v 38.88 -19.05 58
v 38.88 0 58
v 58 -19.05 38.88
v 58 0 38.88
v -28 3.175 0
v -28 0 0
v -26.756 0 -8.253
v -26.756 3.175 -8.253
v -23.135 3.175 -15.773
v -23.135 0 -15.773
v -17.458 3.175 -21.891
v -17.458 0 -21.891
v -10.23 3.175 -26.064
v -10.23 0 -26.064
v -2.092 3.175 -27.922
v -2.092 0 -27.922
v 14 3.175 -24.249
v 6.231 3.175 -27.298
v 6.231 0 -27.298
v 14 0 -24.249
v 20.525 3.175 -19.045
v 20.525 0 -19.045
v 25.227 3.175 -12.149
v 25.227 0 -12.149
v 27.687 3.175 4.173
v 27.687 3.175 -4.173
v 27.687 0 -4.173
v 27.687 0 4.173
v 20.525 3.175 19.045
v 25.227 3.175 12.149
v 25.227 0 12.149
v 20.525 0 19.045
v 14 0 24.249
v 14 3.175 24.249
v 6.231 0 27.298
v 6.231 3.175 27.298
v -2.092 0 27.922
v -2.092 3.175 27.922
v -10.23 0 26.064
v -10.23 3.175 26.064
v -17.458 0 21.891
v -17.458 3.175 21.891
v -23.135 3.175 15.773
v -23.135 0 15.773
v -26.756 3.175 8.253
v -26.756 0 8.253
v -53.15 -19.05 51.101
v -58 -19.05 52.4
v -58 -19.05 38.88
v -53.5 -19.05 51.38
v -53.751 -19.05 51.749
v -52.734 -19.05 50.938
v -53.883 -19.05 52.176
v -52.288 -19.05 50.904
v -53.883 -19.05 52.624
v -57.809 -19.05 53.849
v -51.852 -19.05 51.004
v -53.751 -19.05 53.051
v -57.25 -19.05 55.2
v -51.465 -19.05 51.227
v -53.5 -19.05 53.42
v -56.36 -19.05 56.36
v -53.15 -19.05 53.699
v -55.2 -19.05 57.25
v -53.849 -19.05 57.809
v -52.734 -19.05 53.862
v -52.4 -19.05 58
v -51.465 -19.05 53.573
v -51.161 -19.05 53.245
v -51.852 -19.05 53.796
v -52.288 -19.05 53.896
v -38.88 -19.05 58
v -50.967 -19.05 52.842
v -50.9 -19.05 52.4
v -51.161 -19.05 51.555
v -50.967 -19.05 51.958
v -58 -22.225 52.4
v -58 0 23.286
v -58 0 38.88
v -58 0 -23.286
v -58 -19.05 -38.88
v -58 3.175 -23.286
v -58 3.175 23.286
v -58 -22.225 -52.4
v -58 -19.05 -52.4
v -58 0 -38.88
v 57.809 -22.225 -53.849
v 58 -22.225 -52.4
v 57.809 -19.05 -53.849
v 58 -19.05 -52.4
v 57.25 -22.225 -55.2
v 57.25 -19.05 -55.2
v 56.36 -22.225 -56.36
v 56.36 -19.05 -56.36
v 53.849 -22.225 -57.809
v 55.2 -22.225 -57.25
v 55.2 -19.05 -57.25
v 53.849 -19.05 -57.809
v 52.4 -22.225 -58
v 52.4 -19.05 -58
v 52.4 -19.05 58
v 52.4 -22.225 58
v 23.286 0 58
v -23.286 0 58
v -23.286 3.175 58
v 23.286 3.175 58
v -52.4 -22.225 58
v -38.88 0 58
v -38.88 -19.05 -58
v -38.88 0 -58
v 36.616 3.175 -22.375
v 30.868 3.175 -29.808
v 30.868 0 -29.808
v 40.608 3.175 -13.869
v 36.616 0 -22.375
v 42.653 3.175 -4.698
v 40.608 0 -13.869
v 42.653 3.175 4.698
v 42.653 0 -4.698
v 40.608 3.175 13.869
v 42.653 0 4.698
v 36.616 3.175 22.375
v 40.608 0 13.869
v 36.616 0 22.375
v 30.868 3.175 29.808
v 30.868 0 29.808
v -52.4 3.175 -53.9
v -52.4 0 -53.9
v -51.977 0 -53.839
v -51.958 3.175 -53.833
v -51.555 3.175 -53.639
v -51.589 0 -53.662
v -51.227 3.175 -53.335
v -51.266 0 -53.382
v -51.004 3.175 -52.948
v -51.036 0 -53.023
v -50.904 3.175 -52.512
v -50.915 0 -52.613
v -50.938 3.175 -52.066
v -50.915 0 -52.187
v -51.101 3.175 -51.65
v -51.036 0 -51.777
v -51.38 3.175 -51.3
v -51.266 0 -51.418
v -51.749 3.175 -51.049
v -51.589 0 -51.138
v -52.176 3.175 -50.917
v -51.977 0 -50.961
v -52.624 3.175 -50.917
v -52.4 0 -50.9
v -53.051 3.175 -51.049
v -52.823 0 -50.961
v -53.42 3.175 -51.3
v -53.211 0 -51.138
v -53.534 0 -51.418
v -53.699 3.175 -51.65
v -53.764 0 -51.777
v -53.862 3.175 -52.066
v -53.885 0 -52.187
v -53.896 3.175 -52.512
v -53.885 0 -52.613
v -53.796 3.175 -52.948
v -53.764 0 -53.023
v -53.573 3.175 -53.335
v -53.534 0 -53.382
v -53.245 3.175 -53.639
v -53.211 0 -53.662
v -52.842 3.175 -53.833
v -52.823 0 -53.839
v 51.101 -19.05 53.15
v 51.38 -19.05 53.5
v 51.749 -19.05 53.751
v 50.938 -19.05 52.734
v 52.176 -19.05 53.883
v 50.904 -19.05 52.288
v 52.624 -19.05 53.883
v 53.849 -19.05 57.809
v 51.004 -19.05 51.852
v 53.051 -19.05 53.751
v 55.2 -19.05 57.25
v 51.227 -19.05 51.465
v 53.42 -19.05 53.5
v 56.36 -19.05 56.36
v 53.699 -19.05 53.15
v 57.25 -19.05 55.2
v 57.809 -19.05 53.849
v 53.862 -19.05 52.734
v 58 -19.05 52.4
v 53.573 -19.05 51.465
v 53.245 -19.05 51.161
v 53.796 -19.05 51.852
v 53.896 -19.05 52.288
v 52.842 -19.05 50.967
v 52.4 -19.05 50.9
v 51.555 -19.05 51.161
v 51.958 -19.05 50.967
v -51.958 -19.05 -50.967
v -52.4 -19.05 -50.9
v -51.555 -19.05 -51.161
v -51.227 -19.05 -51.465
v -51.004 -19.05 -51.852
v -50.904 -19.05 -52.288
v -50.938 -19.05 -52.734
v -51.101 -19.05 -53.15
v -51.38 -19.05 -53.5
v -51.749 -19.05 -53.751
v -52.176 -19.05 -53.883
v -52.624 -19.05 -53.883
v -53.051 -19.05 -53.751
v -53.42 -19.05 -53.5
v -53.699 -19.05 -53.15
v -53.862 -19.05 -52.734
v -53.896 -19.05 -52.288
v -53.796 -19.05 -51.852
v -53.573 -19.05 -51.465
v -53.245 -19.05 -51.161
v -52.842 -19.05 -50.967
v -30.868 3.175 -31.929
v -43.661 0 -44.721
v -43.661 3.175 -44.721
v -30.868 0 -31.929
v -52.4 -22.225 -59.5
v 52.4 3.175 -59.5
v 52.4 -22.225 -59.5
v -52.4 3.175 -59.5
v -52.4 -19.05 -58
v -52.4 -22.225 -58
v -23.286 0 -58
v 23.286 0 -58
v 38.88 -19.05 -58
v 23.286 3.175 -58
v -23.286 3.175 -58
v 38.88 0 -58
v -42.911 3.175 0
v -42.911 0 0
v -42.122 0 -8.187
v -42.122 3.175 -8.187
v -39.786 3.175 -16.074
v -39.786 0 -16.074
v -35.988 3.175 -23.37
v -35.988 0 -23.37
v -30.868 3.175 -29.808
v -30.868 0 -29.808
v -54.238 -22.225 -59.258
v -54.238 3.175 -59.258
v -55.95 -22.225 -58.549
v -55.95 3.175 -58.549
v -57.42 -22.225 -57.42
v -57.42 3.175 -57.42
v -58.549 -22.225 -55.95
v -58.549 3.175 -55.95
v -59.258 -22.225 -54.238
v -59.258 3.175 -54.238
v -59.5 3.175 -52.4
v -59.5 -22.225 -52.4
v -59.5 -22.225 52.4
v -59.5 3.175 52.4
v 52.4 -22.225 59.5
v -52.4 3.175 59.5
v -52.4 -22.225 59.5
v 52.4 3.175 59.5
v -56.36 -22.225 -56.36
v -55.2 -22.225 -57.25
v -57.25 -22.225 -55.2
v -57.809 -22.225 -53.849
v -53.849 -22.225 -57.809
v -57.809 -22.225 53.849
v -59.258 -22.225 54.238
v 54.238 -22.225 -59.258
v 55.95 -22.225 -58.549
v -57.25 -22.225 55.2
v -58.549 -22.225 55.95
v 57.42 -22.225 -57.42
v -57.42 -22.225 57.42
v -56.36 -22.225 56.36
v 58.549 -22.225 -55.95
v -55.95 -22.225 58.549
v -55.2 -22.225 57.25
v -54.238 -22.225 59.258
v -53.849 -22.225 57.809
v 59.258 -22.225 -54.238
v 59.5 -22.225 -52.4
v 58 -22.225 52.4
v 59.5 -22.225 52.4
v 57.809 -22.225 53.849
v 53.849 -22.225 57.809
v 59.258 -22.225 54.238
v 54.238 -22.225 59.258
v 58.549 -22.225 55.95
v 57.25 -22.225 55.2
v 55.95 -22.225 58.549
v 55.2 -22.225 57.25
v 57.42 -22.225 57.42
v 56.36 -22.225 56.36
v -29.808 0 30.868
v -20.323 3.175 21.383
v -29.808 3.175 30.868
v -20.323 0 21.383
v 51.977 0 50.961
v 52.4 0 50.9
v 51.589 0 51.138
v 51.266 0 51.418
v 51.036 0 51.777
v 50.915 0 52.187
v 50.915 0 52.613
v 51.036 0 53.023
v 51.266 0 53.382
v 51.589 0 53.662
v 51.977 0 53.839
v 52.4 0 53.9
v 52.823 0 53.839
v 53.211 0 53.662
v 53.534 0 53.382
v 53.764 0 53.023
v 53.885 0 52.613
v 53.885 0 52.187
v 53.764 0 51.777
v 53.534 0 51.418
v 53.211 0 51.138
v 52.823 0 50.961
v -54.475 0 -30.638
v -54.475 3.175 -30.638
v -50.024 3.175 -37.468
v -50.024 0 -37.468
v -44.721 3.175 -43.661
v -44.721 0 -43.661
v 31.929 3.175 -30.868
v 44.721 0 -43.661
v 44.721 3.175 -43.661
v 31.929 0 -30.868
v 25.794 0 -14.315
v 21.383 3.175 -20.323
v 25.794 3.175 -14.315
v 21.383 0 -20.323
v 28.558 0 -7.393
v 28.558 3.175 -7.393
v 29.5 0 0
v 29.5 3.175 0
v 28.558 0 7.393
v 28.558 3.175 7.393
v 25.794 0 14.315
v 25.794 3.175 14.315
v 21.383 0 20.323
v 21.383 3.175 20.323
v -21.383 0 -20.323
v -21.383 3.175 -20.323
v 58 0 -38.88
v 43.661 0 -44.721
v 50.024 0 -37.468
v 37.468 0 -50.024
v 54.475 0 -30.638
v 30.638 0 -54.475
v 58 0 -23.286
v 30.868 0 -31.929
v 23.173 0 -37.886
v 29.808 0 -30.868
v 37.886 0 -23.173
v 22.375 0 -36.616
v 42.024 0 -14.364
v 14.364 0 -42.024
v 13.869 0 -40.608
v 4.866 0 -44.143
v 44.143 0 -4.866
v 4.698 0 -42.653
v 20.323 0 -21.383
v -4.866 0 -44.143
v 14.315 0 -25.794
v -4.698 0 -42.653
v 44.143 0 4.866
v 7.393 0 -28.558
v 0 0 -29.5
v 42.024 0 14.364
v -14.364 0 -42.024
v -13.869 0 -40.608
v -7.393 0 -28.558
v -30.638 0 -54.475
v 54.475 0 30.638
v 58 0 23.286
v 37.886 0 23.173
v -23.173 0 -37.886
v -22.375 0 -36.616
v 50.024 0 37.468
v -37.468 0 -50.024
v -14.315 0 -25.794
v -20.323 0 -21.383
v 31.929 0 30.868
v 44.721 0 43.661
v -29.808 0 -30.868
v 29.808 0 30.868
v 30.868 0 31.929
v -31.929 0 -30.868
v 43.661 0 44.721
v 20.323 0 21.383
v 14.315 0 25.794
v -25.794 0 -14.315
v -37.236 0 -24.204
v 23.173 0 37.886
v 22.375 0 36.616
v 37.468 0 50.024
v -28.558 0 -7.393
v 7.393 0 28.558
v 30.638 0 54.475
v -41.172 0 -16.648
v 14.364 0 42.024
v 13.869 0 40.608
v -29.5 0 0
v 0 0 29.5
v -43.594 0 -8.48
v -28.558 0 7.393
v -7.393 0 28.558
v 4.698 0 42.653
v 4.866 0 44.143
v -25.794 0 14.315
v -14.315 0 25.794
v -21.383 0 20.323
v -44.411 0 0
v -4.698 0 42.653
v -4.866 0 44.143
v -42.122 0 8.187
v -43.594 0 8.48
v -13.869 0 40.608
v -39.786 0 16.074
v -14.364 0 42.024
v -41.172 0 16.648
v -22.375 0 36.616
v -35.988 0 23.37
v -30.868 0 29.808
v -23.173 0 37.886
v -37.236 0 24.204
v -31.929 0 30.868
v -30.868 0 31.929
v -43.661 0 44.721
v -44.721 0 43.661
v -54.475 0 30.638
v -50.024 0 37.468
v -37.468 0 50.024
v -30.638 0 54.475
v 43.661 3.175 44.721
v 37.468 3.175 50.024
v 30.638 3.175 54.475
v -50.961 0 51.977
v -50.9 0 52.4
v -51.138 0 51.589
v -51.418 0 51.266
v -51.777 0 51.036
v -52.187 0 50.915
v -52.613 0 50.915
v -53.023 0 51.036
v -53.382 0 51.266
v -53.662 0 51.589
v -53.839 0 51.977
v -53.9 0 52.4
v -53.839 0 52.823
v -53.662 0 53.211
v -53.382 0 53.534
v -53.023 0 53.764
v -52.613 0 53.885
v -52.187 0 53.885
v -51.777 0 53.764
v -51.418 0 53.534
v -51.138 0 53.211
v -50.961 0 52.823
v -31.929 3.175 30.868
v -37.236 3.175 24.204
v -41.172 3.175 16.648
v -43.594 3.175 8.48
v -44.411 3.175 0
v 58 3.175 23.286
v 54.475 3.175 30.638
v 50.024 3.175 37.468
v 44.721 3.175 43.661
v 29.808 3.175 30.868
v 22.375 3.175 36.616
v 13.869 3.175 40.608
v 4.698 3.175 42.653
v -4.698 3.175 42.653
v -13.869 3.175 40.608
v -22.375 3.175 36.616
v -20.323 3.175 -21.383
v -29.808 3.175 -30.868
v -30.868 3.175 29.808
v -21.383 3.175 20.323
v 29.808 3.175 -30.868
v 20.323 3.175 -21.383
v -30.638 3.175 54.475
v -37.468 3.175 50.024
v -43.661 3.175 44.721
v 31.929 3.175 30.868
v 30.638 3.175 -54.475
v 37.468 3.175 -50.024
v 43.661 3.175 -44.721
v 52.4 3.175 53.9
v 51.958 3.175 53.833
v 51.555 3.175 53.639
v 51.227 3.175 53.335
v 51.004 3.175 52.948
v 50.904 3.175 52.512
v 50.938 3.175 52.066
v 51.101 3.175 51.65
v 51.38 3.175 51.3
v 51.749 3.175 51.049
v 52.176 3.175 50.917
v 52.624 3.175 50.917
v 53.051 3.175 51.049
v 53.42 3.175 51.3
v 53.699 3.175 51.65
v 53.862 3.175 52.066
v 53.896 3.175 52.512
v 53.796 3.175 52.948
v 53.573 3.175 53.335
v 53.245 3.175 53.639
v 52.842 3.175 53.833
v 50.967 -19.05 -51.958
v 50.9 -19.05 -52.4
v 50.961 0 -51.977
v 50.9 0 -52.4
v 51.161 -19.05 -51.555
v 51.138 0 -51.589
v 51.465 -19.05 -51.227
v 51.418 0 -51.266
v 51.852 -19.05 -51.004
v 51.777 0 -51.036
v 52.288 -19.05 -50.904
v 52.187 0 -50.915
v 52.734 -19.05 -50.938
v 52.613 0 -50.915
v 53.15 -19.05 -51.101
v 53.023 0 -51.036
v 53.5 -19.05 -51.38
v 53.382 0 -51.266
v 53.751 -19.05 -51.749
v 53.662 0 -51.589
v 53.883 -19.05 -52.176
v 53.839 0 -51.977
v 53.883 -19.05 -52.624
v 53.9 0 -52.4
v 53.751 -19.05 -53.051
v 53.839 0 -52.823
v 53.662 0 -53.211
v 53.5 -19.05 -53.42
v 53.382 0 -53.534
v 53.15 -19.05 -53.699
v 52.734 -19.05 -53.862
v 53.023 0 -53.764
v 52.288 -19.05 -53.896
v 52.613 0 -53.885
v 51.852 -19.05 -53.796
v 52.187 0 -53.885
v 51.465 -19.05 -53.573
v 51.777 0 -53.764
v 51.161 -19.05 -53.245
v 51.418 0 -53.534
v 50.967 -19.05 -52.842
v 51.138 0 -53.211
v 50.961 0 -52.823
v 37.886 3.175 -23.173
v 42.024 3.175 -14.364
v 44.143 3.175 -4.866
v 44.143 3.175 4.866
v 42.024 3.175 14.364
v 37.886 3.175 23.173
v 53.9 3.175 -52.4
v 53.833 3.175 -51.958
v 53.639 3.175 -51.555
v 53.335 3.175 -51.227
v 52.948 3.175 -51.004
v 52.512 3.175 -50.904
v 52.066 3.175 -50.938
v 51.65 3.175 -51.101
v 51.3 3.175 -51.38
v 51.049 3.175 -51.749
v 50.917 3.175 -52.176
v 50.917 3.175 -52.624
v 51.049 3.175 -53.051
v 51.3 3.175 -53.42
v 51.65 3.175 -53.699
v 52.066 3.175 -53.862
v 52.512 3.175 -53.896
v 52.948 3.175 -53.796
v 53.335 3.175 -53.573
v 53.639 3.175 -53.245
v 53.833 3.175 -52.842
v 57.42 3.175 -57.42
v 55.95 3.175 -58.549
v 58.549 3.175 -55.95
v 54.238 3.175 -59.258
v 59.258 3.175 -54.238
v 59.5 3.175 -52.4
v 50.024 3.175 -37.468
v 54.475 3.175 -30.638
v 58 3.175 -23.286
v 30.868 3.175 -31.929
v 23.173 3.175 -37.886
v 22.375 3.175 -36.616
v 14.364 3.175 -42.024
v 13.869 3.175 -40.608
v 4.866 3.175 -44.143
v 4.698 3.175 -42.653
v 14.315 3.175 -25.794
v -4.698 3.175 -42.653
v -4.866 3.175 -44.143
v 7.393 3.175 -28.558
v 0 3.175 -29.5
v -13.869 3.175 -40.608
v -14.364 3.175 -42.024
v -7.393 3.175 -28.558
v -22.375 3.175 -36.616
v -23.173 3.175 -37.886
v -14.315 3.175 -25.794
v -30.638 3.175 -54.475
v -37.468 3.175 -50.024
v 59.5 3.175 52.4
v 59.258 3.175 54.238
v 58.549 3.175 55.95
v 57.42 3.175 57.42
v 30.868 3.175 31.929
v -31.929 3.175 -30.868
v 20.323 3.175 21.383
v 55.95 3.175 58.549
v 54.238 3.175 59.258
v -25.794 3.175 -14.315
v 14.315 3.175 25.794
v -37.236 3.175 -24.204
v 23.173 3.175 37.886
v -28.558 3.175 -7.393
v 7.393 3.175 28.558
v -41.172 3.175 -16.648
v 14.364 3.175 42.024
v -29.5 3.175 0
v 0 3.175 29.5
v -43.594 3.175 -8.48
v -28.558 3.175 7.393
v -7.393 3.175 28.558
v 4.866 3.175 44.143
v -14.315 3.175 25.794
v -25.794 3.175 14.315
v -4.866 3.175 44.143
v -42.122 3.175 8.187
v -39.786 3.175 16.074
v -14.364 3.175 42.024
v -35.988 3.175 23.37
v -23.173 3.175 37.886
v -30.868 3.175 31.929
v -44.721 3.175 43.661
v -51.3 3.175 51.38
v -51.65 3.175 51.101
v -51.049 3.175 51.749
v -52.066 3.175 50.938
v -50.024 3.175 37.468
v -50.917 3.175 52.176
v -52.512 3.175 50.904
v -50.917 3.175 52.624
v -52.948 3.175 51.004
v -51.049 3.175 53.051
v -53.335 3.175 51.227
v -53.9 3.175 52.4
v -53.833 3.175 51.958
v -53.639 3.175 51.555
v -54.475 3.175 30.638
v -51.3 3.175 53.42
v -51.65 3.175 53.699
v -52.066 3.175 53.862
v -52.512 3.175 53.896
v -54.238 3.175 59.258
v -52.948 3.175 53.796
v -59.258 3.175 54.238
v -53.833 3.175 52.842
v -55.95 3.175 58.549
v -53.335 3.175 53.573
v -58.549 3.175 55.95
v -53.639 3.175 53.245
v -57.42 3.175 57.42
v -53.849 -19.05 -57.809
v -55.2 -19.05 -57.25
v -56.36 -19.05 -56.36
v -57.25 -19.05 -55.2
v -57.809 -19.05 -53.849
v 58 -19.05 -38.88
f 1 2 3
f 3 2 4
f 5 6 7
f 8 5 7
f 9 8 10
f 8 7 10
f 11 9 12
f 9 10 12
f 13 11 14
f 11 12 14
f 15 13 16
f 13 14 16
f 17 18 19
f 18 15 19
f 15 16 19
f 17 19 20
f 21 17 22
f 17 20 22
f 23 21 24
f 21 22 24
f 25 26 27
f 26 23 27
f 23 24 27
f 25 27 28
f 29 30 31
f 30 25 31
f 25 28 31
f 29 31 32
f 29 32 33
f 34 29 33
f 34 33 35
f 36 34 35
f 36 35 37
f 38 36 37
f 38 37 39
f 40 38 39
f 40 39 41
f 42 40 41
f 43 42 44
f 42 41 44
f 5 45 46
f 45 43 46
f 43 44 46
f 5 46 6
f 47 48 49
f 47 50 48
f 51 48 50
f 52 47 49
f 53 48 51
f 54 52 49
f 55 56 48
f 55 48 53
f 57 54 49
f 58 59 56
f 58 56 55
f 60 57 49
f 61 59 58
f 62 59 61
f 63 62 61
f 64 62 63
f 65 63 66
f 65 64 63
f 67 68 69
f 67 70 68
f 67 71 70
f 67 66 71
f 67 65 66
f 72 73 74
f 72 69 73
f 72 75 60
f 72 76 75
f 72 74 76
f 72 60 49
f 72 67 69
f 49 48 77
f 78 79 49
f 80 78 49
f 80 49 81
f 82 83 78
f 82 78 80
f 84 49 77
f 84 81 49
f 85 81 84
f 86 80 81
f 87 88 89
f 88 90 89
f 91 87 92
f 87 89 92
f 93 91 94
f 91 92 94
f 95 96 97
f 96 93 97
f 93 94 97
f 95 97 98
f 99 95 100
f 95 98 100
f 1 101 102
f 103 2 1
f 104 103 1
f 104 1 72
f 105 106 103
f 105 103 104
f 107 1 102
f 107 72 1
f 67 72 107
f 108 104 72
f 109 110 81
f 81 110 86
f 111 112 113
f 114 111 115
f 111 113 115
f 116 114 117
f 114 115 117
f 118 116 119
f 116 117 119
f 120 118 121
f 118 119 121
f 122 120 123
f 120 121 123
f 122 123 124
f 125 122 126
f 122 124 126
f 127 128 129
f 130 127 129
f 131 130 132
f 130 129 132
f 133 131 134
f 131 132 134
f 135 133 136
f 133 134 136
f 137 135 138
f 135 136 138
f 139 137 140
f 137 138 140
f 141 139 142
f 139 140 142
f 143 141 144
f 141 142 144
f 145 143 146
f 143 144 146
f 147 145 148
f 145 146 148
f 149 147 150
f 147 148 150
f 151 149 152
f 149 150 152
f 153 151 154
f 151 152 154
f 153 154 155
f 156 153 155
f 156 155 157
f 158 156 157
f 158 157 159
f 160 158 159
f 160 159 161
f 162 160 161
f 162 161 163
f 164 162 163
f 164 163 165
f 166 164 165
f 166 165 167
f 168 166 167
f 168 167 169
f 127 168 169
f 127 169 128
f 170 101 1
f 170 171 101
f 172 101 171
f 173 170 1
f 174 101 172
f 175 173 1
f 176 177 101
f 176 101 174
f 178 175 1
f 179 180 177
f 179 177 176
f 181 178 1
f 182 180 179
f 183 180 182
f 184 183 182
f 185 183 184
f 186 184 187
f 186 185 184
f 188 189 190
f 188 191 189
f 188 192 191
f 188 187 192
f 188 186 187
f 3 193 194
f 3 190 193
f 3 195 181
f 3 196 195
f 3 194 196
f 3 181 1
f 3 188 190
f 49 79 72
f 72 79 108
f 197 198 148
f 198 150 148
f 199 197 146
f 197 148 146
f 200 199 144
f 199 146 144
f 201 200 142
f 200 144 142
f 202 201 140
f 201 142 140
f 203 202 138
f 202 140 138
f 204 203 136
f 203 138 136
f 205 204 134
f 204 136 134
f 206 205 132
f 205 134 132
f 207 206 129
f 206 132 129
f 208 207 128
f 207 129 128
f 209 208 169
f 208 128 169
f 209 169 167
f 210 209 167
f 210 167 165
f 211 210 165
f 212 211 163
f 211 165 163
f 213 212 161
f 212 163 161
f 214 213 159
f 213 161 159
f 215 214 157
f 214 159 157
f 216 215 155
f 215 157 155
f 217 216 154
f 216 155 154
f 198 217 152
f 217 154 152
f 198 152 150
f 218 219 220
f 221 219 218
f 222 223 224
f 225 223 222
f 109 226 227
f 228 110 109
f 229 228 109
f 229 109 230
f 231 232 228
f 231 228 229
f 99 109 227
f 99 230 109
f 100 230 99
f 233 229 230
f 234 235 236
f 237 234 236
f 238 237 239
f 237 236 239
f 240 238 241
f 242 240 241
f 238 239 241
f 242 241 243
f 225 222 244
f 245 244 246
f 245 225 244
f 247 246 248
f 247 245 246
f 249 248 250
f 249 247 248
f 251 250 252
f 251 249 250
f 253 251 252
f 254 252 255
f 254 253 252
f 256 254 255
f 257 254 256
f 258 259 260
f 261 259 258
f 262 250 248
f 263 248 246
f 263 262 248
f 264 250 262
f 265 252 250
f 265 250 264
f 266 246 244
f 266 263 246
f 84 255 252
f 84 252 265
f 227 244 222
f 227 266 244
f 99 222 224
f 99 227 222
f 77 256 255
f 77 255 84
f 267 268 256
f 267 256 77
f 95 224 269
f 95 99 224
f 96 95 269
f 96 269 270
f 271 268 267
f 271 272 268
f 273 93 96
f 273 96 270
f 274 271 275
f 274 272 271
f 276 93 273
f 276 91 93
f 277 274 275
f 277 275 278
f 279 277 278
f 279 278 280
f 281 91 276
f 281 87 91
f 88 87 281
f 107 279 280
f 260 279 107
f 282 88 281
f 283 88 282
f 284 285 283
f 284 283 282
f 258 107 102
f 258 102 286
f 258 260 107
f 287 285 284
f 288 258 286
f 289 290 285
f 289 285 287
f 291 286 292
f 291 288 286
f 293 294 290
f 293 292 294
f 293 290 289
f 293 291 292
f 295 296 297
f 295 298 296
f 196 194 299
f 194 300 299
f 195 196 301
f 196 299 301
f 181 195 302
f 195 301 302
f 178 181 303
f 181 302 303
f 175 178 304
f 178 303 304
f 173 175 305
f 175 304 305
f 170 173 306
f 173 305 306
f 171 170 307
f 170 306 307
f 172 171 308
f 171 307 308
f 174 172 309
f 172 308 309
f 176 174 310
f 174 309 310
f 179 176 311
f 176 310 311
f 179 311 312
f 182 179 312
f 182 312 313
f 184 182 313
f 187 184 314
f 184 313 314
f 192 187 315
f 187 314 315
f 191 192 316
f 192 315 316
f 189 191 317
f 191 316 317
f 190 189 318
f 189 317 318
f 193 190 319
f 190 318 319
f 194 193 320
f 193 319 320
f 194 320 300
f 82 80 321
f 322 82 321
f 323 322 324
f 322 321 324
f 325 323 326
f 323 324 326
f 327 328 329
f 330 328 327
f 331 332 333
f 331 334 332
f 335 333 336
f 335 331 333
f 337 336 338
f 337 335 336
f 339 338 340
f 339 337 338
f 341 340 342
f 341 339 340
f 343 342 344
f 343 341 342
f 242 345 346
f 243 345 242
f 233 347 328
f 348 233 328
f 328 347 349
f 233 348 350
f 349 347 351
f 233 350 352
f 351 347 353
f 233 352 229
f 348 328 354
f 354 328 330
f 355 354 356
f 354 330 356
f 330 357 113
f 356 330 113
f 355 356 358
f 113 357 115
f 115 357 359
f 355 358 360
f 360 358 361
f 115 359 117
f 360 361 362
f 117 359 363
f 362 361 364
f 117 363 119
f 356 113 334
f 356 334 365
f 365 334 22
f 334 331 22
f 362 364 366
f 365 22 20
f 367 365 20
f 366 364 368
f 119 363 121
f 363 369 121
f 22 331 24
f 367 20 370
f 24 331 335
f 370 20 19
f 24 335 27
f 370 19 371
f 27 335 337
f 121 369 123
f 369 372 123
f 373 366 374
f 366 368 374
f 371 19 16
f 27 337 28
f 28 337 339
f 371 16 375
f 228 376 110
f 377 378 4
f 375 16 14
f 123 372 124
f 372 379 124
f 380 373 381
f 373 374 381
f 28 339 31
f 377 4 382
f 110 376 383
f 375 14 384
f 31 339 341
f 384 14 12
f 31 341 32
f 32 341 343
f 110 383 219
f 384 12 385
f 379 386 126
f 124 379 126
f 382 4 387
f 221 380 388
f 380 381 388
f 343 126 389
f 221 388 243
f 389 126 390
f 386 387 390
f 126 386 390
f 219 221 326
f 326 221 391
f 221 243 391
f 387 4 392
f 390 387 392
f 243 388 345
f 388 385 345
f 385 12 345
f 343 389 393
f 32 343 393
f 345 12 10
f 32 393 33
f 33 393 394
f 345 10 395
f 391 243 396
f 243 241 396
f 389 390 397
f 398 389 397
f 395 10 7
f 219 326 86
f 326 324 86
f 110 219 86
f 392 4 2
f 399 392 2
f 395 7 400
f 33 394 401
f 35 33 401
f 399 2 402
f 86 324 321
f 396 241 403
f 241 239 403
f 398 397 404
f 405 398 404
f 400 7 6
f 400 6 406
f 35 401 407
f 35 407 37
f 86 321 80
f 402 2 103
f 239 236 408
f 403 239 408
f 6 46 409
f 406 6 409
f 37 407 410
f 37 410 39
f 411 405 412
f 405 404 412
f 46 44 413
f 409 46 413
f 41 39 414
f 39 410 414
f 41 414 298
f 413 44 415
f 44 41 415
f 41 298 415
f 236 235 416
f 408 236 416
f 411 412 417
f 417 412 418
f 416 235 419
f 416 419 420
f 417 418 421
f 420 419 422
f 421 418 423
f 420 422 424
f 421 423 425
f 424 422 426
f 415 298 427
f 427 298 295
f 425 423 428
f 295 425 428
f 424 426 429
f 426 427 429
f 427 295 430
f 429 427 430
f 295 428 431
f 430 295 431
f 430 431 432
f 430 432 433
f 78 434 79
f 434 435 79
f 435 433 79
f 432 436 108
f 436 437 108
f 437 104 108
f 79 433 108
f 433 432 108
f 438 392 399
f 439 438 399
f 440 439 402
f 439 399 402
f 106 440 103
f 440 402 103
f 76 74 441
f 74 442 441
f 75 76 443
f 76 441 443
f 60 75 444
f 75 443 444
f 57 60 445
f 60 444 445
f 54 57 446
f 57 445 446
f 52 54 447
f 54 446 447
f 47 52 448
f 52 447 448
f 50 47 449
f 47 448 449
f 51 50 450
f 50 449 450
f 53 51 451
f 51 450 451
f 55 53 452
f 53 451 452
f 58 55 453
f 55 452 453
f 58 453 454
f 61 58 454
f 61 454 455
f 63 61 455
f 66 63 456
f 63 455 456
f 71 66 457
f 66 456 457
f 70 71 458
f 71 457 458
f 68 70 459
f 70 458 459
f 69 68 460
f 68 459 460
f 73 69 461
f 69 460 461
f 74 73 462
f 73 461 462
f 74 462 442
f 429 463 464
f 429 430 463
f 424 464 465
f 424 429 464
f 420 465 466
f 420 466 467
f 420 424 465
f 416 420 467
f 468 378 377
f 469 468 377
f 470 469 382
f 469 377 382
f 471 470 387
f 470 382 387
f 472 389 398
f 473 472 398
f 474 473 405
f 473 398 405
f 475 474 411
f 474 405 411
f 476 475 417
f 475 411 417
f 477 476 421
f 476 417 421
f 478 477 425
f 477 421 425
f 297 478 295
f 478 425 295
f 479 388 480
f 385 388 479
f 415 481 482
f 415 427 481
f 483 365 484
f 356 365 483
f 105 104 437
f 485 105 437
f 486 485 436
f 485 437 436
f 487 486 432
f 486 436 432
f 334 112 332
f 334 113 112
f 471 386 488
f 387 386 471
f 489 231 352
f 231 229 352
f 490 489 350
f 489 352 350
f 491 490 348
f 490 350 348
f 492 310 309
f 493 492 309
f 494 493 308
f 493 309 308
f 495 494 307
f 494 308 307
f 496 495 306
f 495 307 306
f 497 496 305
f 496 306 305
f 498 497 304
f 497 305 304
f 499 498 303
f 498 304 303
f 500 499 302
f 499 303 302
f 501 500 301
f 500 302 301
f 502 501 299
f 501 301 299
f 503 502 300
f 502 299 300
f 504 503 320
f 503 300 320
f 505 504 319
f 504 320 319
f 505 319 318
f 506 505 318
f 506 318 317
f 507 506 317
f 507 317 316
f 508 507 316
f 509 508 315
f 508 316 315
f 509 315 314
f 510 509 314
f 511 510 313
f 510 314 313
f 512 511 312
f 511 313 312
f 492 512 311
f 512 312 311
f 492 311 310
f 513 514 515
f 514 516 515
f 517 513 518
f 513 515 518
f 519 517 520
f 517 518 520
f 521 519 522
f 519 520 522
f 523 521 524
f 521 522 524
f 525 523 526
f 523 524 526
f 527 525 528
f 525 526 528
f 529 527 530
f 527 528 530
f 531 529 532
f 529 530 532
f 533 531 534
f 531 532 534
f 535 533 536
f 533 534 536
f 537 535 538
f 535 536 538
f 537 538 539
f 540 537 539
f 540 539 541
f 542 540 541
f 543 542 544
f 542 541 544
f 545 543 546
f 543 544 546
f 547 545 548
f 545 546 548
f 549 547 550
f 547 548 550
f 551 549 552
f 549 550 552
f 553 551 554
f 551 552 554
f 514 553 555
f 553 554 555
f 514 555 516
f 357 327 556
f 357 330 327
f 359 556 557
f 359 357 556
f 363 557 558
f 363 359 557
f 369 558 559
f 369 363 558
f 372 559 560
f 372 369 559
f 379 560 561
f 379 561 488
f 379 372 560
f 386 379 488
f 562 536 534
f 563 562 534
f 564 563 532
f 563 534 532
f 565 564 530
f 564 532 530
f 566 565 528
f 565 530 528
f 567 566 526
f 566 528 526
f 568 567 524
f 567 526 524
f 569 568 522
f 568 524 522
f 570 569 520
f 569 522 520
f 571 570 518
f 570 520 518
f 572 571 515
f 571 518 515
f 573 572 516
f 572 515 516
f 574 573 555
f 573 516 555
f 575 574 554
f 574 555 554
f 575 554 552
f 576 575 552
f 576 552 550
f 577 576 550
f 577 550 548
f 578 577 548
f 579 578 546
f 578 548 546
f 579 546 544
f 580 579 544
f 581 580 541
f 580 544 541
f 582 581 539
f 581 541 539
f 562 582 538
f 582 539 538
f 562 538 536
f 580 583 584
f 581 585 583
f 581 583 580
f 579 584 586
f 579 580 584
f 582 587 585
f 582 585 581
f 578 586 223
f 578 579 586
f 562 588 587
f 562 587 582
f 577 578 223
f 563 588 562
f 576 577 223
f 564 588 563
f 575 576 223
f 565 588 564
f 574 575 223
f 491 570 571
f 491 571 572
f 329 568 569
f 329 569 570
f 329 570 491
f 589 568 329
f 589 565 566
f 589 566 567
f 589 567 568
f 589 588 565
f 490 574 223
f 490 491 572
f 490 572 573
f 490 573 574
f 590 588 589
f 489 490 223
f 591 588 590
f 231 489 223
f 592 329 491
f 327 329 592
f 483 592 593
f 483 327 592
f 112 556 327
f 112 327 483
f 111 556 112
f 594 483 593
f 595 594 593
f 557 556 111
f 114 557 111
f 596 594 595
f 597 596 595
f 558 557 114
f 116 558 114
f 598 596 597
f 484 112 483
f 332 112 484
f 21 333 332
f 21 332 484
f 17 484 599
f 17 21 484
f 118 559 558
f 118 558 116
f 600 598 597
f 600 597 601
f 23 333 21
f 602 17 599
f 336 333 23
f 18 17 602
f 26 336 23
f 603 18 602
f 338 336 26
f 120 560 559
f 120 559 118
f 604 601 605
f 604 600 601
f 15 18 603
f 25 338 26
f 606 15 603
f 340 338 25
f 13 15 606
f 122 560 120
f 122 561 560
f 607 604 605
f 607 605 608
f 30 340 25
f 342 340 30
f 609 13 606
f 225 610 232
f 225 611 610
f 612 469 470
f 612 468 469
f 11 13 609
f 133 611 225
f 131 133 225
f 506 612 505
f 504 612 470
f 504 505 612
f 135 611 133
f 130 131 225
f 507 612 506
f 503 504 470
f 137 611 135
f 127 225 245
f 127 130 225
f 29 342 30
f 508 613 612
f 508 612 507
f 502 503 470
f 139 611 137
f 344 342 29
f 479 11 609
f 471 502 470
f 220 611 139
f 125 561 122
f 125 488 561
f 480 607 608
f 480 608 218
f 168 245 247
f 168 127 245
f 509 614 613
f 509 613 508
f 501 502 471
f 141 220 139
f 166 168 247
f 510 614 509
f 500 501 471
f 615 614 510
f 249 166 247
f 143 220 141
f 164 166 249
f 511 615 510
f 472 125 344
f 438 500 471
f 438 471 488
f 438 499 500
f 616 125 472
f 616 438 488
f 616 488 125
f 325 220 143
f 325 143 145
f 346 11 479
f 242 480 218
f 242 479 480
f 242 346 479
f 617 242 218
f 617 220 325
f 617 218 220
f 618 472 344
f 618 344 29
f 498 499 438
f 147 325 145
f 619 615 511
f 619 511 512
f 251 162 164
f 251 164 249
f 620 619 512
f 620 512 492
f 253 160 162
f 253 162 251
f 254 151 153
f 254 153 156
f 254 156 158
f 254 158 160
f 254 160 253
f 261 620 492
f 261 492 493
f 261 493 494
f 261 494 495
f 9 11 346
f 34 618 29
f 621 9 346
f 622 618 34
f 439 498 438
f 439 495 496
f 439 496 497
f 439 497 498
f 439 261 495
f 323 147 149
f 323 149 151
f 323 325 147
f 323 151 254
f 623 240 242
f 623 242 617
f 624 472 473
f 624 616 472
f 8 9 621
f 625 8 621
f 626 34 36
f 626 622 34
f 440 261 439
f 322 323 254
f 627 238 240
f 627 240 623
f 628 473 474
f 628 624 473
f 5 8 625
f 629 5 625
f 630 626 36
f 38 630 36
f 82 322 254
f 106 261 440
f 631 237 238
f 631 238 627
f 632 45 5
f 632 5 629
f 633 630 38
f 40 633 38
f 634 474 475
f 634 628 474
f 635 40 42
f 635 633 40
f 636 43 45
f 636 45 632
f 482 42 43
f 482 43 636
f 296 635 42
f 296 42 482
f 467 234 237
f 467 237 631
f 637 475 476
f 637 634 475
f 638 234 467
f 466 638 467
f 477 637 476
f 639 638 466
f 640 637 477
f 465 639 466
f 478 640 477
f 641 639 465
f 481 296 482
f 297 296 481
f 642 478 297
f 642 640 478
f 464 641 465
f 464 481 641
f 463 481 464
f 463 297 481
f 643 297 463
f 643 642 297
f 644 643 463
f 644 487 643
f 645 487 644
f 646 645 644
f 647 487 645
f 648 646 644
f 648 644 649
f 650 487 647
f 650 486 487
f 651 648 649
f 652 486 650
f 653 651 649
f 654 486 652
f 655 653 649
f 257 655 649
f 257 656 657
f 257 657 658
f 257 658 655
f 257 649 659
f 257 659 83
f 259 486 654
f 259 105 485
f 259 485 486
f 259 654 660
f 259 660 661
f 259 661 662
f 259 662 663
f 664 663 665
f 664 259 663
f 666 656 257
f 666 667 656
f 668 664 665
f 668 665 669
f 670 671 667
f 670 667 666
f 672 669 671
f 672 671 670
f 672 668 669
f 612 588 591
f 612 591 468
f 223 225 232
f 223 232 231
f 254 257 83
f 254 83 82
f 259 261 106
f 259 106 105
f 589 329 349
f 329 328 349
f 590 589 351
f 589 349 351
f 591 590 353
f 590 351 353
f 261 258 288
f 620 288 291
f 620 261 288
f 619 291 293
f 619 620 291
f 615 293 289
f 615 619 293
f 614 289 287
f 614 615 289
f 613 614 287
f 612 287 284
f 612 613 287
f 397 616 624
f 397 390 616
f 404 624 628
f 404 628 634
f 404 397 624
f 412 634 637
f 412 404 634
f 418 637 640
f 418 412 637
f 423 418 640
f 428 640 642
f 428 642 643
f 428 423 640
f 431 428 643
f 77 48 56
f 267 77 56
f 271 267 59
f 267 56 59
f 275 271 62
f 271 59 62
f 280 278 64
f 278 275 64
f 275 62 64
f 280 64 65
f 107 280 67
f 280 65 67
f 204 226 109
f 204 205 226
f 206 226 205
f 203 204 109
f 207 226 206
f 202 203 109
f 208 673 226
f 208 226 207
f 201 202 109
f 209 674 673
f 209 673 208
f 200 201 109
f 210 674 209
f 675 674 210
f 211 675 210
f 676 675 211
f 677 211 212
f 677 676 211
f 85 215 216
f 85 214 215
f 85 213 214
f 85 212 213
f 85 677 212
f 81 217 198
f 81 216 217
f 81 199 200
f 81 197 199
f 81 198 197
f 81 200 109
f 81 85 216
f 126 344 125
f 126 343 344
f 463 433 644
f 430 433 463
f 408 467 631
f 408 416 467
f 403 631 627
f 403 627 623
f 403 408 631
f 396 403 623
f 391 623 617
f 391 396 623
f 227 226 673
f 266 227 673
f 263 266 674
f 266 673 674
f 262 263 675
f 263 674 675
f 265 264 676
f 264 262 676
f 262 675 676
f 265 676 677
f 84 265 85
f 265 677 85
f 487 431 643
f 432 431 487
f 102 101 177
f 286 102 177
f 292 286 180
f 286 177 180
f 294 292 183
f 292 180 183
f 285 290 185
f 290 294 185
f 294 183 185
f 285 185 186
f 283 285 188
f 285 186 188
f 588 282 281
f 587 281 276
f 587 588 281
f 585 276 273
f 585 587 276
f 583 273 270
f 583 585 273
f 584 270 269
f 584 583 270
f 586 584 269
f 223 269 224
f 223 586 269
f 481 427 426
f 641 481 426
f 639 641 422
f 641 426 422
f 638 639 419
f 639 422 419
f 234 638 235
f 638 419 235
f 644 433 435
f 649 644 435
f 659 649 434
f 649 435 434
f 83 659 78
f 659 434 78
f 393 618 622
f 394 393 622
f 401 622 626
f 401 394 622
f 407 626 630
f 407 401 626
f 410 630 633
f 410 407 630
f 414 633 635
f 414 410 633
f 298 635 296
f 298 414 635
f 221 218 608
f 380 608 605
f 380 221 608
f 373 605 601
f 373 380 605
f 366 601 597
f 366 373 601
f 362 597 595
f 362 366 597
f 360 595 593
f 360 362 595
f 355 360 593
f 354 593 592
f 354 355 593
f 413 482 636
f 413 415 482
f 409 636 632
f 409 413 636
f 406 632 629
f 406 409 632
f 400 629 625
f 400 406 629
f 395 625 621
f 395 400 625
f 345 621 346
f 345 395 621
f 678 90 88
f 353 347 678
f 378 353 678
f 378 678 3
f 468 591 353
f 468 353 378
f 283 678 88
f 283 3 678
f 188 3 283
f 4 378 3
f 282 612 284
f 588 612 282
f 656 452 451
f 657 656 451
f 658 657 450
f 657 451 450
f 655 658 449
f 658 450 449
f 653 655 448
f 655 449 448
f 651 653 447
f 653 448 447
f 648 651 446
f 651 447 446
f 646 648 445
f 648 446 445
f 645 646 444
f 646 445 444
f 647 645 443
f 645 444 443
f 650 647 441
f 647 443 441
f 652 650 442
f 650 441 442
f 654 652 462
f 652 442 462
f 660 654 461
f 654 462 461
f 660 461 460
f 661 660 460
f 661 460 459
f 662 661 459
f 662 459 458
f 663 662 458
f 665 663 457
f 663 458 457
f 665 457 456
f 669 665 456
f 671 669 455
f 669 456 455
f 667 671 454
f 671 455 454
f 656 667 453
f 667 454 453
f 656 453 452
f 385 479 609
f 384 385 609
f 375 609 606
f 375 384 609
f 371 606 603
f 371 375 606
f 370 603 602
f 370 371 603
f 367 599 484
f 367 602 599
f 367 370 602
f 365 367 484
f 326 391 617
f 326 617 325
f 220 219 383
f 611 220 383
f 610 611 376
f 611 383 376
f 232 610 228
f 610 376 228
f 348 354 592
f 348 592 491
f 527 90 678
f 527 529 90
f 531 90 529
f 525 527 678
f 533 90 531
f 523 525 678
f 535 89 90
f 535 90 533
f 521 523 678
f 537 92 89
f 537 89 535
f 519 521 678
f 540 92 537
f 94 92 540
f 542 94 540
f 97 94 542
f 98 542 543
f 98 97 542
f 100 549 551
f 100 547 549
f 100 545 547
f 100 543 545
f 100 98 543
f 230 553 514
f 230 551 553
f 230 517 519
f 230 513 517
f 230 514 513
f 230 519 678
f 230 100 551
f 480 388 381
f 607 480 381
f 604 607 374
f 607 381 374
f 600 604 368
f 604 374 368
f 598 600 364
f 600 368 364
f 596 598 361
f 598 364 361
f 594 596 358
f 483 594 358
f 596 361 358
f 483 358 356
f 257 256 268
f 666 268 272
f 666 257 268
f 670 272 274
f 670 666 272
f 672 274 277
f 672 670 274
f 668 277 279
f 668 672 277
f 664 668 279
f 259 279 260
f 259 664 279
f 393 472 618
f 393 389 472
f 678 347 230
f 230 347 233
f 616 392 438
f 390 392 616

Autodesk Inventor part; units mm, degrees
ref_plane "YZ Plane" through (0, 0, 0) normal (1, 0, 0) x (0, 1, 0)
ref_plane "XZ Plane" through (0, 0, 0) normal (0, 1, 0) x (-1, 0, 0)
ref_plane "XY Plane" through (0, 0, 0) normal (0, 0, 1) x (1, 0, 0)
sketch "Sketch1" plane through (0, 0, 0) normal (0, 1, 0) x (-1, 0, 0)
  line L0 (-59.5, 59.5) -> (59.5, 59.5)
  line L1 (59.5, 59.5) -> (59.5, -59.5)
  line L2 (59.5, -59.5) -> (-59.5, -59.5)
  line L3 (-59.5, -59.5) -> (-59.5, 59.5)
  line L4 (-59.5, 59.5) -> (59.5, -59.5) construction
  line L5 (59.5, 59.5) -> (-59.5, -59.5) construction
  circle A0 centre (52.4, 52.4) radius 1.5
  circle A1 centre (52.4, -52.4) radius 1.5
  arc A2 (58, 23.2863) -> (23.2863, 58) centre (0, 0) ccw
  arc A3 (23.2863, -58) -> (58, -23.2863) centre (0, 0) ccw
  arc A4 (-58, -23.2863) -> (-23.2863, -58) centre (0, 0) ccw
  arc A5 (-23.2863, 58) -> (-58, 23.2863) centre (0, 0) ccw
  line L6 (23.2863, 58) -> (-23.2863, 58)
  line L7 (-58, 23.2863) -> (-58, -23.2863)
  line L8 (-23.2863, -58) -> (23.2863, -58)
  line L9 (58, -23.2863) -> (58, 23.2863)
  arc A6 (59.5, 52.4) -> (52.4, 59.5) centre (52.4, 52.4) ccw
  line L10 (48.2954, 59.5) -> (44.1942, 44.1942)
  line L11 (44.1942, 44.1942) -> (59.5, 48.2954)
  circle A7 centre (0, 0) radius 28
  circle A8 centre (0, 0) radius 29.5
  line L12 (44.7213, 43.6607) -> (21.3832, 20.3226)
  line L13 (20.3226, 21.3832) -> (43.6607, 44.7213)
  circle A9 centre (0, 0) radius 43.6607 construction
  line L14 (44.7213, 43.6607) -> (0, 43.6607) construction
  circle A10 centre (0, 0) radius 44.4107
  circle A11 centre (0, 0) radius 42.9107
  point P0 (0, 58)
  dimension "d0" = 119
  dimension "d1" = 3
  dimension "d2" = 104.8
  dimension "d4" = 62.5
  dimension "d7" = 116
  dimension "d9" = 30
  dimension "d38" = 56
  dimension "d39" = 1.5
  dimension "d40" = 1.5
  dimension "d41" = 1.5
  dimension "d83" = 1.5
  dimension "d84" = 0.75
extrude "Extrusion8" add sketch "Sketch1" along normal blind 3.175 contours L0 L10 L11 L1 L2 L3 | L0 A6 L1 L11 L10 | L0 L1 A6 | A8 | A0 | A1
extrude "Extrusion9" add sketch "Sketch1" along normal blind 3.175 contours A2 L12 A10 L13 | L12 A11 L13 A10 | L12 A8 L13 A11 picked at (31.1052, 30.2803) picked at (23.6041, 24.429)
extrude "Extrusion10" cut sketch "Sketch1" along normal up to next contours L0 L1 A6 | A0
pattern_circular "Circular Pattern4" count 4 over 360 about axis through (0, 0, 0) along (0, 1, 0) of "Extrusion10", "Extrusion9"
sketch "Sketch4" plane through (0, 0, 0) normal (0, -1, 0) x (1, 0, 0)
  arc A0 (-52.4, 59.5) -> (-59.5, 52.4) centre (-52.4, 52.4) ccw projected
  line L0 (-52.4, 59.5) -> (52.4, 59.5) projected
  line L1 (-59.5, -52.4) -> (-59.5, 52.4) projected
  arc A1 (-59.5, -52.4) -> (-52.4, -59.5) centre (-52.4, -52.4) ccw projected
  line L2 (52.4, -59.5) -> (-52.4, -59.5) projected
  arc A2 (52.4, -59.5) -> (59.5, -52.4) centre (52.4, -52.4) ccw projected
  line L3 (59.5, 52.4) -> (59.5, -52.4) projected
  arc A3 (59.5, 52.4) -> (52.4, 59.5) centre (52.4, 52.4) ccw projected
  line L4 (52.4, 58) -> (-52.4, 58)
  arc A4 (-52.4, 58) -> (-58, 52.4) centre (-52.4, 52.4) ccw
  line L5 (-58, 52.4) -> (-58, -52.4)
  arc A5 (-58, -52.4) -> (-52.4, -58) centre (-52.4, -52.4) ccw
  line L6 (-52.4, -58) -> (52.4, -58)
  arc A6 (52.4, -58) -> (58, -52.4) centre (52.4, -52.4) ccw
  line L7 (58, -52.4) -> (58, 52.4)
  arc A7 (58, 52.4) -> (52.4, 58) centre (52.4, 52.4) ccw
  line L8 (-58, 38.8804) -> (-38.8804, 58)
  line L9 (-52.4, 52.4) -> (-48.4402, 48.4402) construction
  line L10 (-52.4, 52.4) -> (-56.3598, 56.3598) construction
  circle A8 centre (-52.4, 52.4) radius 1.5 projected
  point P0 (0, 0)
  dimension "d51" = 1.5
  dimension "d52" = 45
extrude "Extrusion11" add sketch "Sketch4" along normal blind 22.225 contours L0 A3 L3 A2 L2 A1 L1 A0
extrude "Extrusion12" add sketch "Sketch4" along normal blind 19.05 contours L8 L5 A4 L4
pattern_circular "Circular Pattern5" count 4 over 360 about axis through (0, 0, 0) along (0, 1, 0) of "Extrusion12"
extrude "Extrusion18" add sketch "Sketch1" along normal blind 3.175 contours A10 L13 A11 L12 | L12 A11 L13 A10
equation "\"d0\" = length"
equation "\"d1\" = holeSize"
equation "\"d2\" = dHoles"
equation "\"d4\" = 0.5 * fanDia"
equation "\"d7\" = fanCutOff"
equation "\"d38\" = fanCenter"
equation "\"d40\" = d39"
equation "\"d41\" = d40"
equation "\"d83\" = d39"
equation "\"d84\" = 0.5 * d39"
equation "\"d51\" = d40"
equation "\"d55\" = filterHeight"
equation "\"holeSize\" = 3"
equation "\"filterHeight\" = 19.05"
equation "\"length\" = 119"
equation "\"dHoles\" = 104.8"
equation "\"fanDia\" = 125"
equation "\"fanCutOff\" = 116"
equation "\"fanCenter\" = 56"
properties part number "filterFrame"
